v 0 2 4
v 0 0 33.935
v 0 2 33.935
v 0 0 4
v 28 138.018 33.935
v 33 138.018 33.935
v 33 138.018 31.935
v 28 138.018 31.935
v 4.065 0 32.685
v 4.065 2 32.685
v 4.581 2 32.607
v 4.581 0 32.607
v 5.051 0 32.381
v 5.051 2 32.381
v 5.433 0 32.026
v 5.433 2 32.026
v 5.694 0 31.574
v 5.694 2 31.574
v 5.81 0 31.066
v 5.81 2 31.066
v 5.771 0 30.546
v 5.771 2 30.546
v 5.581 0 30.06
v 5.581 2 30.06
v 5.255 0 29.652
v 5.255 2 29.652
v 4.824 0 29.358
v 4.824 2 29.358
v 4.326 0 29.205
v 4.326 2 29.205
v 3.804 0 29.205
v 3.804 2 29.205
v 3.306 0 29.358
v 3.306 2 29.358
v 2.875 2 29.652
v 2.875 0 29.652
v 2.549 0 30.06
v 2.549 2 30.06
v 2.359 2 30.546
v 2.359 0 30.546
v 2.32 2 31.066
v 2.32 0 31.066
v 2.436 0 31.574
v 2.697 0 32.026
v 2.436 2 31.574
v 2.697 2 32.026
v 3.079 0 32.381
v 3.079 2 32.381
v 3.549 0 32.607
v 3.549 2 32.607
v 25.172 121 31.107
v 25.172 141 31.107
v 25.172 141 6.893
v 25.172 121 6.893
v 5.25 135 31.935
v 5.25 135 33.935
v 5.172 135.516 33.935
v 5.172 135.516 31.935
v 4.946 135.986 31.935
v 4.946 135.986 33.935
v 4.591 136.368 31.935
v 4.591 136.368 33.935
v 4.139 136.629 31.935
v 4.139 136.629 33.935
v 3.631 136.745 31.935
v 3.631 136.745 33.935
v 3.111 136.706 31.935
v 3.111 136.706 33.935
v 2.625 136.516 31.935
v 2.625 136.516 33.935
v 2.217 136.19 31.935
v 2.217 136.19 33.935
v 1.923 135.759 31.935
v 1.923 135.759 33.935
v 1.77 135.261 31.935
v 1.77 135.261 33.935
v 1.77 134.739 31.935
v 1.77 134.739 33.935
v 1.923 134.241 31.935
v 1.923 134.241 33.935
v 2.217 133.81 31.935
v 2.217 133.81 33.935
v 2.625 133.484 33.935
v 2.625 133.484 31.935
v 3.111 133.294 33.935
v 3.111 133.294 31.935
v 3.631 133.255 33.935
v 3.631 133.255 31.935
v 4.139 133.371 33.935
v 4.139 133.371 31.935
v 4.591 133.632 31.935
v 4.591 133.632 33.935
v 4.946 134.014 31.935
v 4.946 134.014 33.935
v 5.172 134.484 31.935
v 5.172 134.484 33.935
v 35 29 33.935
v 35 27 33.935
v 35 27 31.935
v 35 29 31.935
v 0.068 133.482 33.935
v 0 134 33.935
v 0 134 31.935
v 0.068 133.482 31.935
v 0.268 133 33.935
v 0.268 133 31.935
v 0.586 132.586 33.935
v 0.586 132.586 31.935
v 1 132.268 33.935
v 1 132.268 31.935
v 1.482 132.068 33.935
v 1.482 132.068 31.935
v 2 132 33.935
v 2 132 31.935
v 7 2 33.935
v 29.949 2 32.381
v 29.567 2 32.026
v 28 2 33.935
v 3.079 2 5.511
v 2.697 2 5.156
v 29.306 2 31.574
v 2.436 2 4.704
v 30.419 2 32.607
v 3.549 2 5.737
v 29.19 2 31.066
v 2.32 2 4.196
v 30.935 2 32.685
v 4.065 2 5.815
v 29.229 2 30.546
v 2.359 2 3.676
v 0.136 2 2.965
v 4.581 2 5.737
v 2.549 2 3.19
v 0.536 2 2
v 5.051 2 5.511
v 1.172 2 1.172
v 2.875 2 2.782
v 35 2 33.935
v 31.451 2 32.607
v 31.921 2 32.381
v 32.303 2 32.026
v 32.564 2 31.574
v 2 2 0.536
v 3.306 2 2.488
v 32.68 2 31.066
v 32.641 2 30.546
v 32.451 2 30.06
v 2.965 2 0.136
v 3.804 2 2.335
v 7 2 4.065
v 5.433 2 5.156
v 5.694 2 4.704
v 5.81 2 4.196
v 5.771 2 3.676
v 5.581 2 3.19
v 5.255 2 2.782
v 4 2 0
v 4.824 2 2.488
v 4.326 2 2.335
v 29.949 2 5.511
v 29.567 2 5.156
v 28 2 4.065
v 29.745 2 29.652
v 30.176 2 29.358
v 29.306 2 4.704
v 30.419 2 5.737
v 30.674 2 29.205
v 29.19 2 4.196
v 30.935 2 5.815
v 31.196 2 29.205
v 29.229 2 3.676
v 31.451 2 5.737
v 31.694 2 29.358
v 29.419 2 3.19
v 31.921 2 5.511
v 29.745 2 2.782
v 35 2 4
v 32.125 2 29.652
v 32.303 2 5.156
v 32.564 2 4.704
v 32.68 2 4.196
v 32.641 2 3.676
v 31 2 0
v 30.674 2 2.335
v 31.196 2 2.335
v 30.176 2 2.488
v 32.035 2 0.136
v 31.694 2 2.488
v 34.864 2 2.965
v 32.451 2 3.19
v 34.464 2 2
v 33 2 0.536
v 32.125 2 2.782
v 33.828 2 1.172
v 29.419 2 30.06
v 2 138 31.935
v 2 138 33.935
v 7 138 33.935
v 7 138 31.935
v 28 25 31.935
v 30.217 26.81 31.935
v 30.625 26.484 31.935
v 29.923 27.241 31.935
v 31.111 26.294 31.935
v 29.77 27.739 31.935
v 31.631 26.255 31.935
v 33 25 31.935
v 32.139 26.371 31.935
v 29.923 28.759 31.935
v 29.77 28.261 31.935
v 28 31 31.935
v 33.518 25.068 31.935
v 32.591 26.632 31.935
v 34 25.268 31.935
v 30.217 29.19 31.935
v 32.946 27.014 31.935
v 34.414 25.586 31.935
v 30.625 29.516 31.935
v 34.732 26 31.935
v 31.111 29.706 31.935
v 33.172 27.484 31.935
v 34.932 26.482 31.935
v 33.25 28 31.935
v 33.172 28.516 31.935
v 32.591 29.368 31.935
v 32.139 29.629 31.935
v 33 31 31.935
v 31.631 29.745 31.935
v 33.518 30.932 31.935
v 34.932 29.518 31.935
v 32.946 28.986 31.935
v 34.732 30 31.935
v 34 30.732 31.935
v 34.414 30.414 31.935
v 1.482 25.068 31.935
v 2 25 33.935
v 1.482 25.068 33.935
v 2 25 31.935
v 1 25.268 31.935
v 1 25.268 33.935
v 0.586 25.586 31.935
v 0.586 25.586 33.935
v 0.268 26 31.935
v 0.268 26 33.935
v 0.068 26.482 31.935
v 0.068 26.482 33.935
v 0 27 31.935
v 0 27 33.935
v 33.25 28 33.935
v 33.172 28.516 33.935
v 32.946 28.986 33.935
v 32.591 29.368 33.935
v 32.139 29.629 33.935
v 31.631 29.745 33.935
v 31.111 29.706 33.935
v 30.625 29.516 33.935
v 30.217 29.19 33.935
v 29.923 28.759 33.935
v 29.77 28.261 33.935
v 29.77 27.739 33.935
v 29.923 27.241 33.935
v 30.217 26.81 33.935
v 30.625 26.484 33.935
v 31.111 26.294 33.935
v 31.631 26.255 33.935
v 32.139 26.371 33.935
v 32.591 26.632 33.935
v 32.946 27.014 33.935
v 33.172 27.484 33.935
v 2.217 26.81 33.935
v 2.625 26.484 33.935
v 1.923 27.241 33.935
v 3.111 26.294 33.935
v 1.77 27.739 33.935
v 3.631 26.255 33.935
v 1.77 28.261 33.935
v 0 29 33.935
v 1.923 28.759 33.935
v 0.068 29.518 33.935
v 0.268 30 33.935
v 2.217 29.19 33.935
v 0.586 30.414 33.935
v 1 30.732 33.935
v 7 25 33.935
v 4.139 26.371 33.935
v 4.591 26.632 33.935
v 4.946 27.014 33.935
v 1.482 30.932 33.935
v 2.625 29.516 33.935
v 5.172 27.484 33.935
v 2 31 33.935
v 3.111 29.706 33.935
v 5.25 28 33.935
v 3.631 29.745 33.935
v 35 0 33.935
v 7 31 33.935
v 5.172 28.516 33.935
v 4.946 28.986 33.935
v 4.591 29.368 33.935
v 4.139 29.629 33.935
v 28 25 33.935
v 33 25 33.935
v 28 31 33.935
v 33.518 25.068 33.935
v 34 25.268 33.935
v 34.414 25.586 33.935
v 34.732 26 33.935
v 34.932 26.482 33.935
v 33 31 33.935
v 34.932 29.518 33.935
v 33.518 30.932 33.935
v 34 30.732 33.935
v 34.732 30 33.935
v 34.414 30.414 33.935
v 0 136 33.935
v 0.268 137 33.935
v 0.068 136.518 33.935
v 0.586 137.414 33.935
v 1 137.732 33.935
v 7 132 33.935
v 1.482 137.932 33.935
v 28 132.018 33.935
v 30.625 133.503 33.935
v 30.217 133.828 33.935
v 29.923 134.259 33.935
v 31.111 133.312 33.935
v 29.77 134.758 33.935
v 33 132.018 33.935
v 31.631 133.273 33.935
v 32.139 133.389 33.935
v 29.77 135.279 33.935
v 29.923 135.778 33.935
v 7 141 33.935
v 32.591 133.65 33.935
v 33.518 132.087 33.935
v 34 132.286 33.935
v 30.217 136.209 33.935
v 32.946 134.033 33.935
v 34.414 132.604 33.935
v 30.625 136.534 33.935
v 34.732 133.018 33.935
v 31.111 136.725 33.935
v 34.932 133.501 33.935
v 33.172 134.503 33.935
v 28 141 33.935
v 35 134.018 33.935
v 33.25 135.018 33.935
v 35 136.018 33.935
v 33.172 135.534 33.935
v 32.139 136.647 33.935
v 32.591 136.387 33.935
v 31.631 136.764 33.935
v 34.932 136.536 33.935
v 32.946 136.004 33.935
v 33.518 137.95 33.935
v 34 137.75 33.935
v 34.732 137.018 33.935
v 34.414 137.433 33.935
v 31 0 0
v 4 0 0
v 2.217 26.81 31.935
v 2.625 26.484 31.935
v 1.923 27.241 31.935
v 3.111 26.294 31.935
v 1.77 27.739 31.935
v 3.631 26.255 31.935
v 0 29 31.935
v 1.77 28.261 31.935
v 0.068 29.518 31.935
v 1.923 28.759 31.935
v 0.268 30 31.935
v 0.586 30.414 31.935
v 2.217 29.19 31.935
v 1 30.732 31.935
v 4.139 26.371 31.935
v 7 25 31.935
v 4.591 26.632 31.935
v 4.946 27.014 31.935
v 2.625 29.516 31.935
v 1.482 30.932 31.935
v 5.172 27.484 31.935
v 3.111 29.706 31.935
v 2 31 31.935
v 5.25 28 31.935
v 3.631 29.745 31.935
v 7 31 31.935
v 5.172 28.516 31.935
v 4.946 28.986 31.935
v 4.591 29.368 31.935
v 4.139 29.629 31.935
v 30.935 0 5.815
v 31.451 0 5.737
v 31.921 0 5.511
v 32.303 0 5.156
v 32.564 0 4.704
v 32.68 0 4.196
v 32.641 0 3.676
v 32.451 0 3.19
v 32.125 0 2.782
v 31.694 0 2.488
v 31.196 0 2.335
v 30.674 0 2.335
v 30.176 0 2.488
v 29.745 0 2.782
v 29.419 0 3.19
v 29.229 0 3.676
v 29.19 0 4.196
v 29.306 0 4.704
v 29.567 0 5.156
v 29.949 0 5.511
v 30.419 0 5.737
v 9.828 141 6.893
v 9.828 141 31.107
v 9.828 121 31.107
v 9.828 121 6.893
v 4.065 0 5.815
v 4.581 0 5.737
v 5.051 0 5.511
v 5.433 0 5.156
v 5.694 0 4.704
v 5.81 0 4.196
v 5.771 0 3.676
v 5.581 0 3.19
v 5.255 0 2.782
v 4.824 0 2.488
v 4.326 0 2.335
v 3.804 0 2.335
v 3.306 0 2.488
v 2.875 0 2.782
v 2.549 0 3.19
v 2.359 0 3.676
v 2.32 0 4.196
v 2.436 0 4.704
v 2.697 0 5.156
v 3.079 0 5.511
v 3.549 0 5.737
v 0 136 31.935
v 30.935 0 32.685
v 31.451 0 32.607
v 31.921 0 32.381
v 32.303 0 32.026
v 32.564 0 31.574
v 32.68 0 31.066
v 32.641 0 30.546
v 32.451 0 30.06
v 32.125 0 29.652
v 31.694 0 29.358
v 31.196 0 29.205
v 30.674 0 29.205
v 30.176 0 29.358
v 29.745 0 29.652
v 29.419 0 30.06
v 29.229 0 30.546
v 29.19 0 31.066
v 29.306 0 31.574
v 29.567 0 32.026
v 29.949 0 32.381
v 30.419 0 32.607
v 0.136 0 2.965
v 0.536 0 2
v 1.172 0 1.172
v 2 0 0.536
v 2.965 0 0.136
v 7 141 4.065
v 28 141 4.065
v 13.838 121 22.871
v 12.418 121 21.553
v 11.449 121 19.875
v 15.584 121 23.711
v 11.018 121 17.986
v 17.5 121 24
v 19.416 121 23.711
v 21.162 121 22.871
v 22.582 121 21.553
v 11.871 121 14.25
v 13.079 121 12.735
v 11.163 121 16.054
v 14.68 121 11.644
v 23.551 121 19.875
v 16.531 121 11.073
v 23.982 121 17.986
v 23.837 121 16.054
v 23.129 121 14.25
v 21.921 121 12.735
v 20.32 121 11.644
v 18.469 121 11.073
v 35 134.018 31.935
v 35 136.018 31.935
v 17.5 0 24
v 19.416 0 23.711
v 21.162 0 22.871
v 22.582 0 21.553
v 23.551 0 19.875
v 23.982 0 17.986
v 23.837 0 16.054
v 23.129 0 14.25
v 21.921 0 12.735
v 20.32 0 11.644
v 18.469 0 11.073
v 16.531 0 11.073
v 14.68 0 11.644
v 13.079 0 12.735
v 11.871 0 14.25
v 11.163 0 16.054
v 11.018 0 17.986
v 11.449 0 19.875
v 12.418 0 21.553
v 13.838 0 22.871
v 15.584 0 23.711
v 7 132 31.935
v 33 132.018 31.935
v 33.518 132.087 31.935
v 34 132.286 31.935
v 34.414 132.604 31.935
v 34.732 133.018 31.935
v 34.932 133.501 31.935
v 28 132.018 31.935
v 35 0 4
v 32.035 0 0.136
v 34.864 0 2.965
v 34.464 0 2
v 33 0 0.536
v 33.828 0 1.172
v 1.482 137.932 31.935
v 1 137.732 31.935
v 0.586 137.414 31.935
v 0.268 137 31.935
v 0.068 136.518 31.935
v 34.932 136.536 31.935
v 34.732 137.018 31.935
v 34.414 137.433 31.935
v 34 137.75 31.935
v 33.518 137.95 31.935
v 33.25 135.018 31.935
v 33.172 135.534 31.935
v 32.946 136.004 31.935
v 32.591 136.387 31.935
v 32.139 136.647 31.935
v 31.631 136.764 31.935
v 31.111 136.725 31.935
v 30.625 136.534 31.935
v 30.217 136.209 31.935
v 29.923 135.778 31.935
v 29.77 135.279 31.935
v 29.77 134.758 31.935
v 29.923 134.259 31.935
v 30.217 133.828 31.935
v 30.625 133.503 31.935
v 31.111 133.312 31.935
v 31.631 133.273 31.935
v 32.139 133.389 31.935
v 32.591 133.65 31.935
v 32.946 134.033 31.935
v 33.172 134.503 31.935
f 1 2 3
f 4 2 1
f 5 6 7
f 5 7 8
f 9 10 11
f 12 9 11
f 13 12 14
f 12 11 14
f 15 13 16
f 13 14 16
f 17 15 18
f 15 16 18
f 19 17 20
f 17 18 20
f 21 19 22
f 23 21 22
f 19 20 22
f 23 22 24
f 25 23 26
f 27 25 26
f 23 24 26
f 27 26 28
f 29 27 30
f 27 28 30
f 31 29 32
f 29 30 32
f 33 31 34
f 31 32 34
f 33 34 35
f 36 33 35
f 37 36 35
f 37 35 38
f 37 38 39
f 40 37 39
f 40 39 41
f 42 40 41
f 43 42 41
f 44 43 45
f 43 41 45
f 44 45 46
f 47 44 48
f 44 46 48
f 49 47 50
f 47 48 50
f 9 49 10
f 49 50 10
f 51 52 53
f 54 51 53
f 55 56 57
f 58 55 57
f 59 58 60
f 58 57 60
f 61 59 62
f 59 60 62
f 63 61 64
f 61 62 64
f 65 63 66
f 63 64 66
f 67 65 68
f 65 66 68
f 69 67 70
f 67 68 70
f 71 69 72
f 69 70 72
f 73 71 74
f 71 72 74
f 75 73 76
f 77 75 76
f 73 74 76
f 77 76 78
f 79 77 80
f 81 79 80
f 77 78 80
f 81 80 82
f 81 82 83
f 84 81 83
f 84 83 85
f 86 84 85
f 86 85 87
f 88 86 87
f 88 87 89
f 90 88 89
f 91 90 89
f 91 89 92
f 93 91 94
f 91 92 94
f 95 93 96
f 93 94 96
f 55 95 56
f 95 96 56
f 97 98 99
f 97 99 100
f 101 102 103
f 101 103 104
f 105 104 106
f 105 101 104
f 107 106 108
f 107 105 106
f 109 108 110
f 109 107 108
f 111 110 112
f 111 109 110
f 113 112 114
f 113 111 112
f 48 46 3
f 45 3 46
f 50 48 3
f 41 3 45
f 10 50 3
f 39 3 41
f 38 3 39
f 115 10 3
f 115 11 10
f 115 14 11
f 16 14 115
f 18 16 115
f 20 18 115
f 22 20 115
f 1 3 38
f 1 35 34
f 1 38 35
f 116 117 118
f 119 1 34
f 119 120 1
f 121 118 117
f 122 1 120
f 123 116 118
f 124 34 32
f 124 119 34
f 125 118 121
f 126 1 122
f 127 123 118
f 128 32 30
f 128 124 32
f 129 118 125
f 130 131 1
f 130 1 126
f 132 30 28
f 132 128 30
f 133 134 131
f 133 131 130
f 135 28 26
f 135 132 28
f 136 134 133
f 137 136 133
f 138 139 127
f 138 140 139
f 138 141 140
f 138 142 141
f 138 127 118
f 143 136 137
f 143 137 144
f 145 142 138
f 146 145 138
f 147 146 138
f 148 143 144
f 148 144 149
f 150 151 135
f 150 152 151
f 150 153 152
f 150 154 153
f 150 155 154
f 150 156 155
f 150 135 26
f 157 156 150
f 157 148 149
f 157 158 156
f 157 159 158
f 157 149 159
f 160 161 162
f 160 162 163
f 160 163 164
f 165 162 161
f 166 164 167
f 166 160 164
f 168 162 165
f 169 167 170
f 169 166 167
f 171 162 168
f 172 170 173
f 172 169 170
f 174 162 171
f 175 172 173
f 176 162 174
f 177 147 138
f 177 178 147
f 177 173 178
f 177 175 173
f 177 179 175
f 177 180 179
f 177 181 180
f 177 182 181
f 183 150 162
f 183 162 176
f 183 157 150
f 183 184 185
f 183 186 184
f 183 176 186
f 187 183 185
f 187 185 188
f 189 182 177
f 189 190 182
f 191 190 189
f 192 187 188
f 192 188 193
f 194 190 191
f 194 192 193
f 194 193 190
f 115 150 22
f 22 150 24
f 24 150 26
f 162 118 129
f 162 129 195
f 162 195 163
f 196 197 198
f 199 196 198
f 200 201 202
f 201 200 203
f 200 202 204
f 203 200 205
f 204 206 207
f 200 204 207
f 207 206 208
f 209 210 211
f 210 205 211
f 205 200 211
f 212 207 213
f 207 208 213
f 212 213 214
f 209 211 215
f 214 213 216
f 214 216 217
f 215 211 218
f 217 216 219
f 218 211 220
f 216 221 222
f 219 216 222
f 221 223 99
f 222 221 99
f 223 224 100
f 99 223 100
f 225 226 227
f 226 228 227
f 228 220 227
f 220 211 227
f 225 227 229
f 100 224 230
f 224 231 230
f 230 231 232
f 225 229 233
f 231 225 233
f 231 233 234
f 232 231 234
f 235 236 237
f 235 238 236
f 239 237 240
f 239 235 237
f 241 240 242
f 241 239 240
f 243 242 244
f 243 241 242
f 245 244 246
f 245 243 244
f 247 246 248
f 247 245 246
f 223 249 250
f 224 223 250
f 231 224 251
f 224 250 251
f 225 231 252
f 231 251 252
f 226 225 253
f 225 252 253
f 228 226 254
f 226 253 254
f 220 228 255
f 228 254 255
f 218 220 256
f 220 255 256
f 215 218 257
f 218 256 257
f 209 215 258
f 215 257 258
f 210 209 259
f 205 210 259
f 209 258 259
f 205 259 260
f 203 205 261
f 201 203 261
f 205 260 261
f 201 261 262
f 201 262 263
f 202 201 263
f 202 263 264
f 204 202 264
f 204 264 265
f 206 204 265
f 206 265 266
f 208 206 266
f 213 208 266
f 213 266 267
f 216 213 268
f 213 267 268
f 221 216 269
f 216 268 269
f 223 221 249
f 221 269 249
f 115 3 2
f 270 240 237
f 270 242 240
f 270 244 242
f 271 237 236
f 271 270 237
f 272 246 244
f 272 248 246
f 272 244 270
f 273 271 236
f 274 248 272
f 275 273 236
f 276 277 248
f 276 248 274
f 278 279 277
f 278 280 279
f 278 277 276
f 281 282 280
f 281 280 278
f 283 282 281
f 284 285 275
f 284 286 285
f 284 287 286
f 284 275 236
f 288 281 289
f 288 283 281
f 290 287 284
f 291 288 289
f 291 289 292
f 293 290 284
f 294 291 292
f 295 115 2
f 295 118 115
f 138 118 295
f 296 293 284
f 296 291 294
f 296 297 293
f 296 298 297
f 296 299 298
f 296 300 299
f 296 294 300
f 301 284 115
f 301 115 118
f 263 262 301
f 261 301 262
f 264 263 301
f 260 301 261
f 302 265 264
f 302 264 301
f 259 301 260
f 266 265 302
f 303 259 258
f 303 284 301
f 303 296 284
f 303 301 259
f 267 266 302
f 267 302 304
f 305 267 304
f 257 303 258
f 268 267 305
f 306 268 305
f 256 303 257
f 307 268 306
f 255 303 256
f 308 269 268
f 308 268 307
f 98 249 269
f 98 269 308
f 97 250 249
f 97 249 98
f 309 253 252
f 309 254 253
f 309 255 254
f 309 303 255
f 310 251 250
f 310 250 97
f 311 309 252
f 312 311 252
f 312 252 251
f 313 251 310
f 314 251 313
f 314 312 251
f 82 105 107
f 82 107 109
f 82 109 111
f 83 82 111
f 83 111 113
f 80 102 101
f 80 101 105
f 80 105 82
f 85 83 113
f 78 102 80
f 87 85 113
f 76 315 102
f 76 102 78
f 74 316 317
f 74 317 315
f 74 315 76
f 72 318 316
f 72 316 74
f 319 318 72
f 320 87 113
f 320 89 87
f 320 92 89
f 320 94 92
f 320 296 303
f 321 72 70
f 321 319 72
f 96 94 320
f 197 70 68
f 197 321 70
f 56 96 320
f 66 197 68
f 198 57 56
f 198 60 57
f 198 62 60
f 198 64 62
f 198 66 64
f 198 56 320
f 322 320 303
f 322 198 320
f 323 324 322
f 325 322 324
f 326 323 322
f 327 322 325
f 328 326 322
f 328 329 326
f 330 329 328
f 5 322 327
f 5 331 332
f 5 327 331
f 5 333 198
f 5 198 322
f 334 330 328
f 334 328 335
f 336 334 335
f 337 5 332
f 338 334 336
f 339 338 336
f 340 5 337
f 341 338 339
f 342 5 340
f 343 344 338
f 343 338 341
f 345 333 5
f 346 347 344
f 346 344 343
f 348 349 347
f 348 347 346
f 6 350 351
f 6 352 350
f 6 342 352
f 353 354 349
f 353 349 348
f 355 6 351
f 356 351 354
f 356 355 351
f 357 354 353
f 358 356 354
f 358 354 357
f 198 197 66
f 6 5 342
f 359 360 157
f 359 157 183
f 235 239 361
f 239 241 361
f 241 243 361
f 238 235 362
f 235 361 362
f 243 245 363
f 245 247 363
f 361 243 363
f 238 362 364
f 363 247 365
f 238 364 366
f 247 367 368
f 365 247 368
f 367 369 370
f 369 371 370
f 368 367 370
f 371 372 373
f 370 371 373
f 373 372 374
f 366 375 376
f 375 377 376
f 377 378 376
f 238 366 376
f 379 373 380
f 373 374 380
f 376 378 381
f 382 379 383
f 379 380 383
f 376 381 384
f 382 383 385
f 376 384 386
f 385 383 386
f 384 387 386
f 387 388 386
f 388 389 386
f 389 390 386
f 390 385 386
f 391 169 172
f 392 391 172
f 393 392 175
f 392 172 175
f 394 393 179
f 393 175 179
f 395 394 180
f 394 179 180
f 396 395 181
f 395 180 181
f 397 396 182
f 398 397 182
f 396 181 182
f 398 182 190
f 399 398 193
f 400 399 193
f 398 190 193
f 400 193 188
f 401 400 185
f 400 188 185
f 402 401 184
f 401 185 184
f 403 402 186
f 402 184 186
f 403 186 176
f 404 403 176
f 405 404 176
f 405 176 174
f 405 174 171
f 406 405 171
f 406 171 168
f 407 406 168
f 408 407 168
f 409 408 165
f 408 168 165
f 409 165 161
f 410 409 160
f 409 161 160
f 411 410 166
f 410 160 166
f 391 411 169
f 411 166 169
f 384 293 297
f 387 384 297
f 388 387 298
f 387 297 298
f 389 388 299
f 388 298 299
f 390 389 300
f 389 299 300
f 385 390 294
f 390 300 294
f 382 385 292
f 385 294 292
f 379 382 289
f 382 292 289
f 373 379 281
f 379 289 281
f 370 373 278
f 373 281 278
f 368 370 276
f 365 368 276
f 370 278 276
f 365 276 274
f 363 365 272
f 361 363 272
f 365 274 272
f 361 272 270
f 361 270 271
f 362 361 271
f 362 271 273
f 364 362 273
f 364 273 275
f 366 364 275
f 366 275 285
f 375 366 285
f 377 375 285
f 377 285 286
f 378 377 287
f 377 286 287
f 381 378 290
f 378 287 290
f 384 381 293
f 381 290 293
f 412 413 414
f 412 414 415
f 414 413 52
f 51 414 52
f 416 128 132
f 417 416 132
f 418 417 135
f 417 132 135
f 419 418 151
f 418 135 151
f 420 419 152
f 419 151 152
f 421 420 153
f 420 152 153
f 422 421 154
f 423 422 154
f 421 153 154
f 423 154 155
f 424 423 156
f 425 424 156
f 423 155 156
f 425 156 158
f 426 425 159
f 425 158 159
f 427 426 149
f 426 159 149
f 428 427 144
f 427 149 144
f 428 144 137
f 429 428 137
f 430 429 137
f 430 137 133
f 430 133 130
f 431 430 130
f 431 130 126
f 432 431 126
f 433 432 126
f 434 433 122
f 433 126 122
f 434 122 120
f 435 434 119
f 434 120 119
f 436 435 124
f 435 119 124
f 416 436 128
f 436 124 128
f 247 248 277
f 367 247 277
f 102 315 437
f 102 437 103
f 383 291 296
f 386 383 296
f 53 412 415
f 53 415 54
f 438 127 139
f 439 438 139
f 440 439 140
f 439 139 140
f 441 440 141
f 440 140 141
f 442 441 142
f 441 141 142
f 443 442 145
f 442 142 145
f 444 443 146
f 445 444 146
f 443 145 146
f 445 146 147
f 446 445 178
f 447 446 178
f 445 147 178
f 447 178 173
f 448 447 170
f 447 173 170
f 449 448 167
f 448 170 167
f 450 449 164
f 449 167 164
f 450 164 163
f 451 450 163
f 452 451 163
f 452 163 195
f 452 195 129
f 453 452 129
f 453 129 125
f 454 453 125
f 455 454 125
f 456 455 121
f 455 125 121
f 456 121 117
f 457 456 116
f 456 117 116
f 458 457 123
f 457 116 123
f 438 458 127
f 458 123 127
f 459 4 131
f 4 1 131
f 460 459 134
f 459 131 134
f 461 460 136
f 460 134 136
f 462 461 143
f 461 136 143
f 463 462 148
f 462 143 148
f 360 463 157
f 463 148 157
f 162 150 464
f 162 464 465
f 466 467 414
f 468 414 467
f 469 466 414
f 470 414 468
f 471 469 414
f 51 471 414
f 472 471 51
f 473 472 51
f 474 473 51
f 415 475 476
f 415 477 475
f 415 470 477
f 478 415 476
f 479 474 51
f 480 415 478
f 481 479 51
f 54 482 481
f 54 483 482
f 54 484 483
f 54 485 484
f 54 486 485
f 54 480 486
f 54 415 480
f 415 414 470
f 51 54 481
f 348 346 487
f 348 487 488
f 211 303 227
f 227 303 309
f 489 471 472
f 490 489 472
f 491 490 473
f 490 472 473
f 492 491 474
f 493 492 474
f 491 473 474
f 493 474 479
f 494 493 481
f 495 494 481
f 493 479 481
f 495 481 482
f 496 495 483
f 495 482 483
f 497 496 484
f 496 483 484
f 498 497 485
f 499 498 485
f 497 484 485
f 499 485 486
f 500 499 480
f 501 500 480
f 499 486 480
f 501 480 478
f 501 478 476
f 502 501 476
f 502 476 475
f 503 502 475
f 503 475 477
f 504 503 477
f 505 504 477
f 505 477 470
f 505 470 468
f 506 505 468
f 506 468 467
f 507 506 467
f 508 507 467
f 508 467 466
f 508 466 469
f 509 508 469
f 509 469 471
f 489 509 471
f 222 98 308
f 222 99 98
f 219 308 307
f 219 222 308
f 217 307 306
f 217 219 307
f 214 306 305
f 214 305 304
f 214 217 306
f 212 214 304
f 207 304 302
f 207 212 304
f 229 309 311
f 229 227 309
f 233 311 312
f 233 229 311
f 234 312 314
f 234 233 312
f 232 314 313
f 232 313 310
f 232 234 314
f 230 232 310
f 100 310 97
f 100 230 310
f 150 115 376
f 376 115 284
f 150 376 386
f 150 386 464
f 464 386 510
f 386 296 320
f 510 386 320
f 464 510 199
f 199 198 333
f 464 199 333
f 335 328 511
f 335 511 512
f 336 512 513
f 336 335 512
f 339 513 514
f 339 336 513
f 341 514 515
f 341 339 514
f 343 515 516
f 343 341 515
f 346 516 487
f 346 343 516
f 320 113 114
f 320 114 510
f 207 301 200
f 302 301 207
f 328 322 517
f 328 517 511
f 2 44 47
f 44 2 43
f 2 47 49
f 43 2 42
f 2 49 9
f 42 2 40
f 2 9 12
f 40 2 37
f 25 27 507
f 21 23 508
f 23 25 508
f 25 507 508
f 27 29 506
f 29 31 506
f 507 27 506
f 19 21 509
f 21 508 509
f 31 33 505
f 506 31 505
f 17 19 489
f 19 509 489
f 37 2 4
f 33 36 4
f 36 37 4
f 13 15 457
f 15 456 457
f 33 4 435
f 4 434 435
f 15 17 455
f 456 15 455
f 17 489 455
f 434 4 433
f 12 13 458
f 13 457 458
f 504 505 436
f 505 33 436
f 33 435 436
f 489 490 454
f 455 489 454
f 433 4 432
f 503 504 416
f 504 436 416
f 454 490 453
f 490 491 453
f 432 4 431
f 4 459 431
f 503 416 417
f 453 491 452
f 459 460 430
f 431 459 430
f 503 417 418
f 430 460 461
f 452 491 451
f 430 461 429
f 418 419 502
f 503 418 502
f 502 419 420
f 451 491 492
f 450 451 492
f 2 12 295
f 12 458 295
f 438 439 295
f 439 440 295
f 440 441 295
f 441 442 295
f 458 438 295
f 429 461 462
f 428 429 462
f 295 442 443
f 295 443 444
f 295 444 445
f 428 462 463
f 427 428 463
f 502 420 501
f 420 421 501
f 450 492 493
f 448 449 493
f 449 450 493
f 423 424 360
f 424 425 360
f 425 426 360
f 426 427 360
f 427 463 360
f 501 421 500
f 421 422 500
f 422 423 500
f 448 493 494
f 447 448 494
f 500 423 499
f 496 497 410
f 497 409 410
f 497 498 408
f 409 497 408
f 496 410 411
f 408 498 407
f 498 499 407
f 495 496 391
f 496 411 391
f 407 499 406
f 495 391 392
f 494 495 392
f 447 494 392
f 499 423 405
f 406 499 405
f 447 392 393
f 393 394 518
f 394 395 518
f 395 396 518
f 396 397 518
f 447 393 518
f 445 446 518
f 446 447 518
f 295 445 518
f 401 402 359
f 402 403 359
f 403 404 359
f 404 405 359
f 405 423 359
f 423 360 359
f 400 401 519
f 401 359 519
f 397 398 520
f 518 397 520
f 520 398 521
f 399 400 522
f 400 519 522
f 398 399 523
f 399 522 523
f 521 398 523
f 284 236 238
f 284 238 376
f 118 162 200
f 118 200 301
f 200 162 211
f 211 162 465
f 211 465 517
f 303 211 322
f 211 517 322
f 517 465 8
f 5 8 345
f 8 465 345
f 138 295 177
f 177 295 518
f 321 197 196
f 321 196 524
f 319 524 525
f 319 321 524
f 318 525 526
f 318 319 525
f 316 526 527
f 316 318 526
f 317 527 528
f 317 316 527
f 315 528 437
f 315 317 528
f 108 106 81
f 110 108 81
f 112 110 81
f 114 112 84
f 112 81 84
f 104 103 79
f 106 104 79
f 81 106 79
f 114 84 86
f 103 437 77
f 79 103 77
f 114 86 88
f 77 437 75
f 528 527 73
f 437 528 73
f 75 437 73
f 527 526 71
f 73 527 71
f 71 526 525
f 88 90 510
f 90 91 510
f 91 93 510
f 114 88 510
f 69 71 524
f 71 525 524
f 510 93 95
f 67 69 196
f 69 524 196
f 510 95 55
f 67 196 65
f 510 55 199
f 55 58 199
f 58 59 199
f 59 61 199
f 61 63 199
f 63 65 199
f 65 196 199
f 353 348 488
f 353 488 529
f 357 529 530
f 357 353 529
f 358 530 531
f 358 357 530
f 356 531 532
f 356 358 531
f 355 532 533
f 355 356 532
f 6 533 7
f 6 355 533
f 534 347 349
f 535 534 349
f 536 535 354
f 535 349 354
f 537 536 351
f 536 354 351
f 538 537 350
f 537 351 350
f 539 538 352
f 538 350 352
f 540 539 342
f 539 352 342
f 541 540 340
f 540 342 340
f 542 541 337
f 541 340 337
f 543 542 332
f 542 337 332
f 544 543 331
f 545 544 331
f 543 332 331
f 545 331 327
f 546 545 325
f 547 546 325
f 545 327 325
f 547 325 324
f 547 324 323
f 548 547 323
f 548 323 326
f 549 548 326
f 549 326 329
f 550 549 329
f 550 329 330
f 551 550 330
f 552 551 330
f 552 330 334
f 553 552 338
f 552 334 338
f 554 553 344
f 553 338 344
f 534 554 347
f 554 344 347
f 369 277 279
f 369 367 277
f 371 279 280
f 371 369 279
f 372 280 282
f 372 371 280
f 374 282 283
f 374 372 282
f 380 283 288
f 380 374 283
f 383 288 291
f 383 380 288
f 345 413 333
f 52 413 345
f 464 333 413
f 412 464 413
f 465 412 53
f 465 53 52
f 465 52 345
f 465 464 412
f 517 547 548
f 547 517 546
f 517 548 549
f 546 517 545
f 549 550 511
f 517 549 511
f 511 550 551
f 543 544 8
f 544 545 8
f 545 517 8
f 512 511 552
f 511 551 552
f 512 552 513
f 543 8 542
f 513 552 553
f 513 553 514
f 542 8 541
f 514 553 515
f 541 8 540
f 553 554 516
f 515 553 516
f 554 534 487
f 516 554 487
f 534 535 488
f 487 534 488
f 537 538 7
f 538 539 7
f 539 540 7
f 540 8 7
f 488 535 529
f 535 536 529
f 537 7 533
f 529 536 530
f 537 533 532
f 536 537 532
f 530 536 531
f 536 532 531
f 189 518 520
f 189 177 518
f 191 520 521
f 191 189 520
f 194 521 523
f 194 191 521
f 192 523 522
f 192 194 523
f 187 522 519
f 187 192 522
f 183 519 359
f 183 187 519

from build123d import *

# Parameters (mm, degrees)
ESQUISSE1_W                   = 35
ESQUISSE1_H                   = 35
BOSS_EXTRU_1_DEPTH            = 2
ESQUISSE2_R                   = 1.75
ESQUISSE2_W                   = 35
ESQUISSE2_H                   = 1.064971157
ENL_V_MAT_EXTRU_1_DEPTH       = 2
BOSS_EXTRU_2_DEPTH            = 280
ESQUISSE5_W                   = 7
ESQUISSE5_H                   = 6
ESQUISSE5_R                   = 1.75
BOSS_EXTRU_3_DEPTH            = 2
ESQUISSE6_R                   = 1.75
BOSS_EXTRU_4_DEPTH            = 2
ESQUISSE10_W                  = 35
ESQUISSE10_H                  = 33.935028843
ESQUISSE10_R                  = 1.75
BOSS_EXTRU_5_DEPTH            = 2
ESQUISSE15_R                  = 6.5
ESQUISSE15_R_2                = 1.75
ENL_V_MAT_EXTRU_2_DEPTH       = 373
CONG_1_R                      = 2
CONG_2_R                      = 4
EXTRU_MINCE1_START            = -2
EXTRU_MINCE1_OUTLINE_W        = 35
EXTRU_MINCE1_OUTLINE_H        = 10
EXTRU_MINCE1_DEPTH            = 2
BOSS_EXTRU_7_DEPTH            = 62.5
BOSS_EXTRU_8_DEPTH            = 160
ENL_V_MAT_EXTRU_4_DEPTH       = 15
BOSS_EXTRU_31_DEPTH           = 69.5
BOSS_EXTRU_31_DEPTH_BACK      = 90.5
ESQUISSE29_W                  = 0.210775501
ESQUISSE29_H                  = 2
BOSS_EXTRU_32_DEPTH           = 160
ENL_V_MAT_EXTRU_7_DEPTH       = 10
ENL_V_MAT_EXTRU_7_DEPTH_BACK  = 5
ESQUISSE34_W                  = 144
ESQUISSE34_H                  = 64.710678118
ENL_V_MAT_EXTRU_8_DEPTH       = 2
ESQUISSE35_R                  = 1.5
BOSS_EXTRU_35_DEPTH           = 2
BOSS_EXTRU_36_START           = -2
ESQUISSE36_R                  = 1.5
BOSS_EXTRU_36_DEPTH           = 2
BOSS_EXTRU_37_DEPTH           = 21
BOSS_EXTRU_38_DEPTH           = 28
ESQUISSE42_W                  = 17
ESQUISSE42_H                  = 6
ENL_V_MAT_EXTRU_9_DEPTH       = 124
ESQUISSE43_R                  = 1.1
ENL_V_MAT_EXTRU_11_DEPTH      = 50
ESQUISSE45_R                  = 1.5
ENL_V_MAT_EXTRU_12_DEPTH      = 50
ESQUISSE47_R                  = 1.75
BOSS_EXTRU_40_DEPTH           = 2
ENL_V_MAT_EXTRU_13_DEPTH      = 2
ESQUISSE49_R                  = 1.75
BOSS_EXTRU_41_DEPTH           = 2
ESQUISSE50_W                  = 12.927363302
ESQUISSE50_H                  = 18
ENL_V_MAT_EXTRU_14_DEPTH      = 2
ESQUISSE51_R                  = 1.75
BOSS_EXTRU_42_DEPTH           = 2
ENL_V_MAT_EXTRU_15_DEPTH      = 1000
ENL_V_MAT_EXTRU_15_DEPTH_BACK = 1000
ESQUISSE53_W                  = 15.34314575
ESQUISSE53_H                  = 24.213203648
ENL_V_MAT_EXTRU_16_DEPTH      = 20


# Read off the part's stored shape, not the designer's step: Extru.-Mince1
with BuildPart() as part:
    # Esquisse1 → Boss.-Extru.1 (new body)
    with BuildSketch(Plane(origin=(0, 0, 0), x_dir=(1, 0, 0), z_dir=(0, 1, 0))):
        with Locations((17.5, -17.5)):
            Rectangle(ESQUISSE1_W, ESQUISSE1_H)
    extrude(amount=BOSS_EXTRU_1_DEPTH)

    # Esquisse2 → Enlèv. mat.-Extru.1 (cut)
    with BuildSketch(Plane(origin=(0, 2, 0), x_dir=(1, 0, 0), z_dir=(0, 1, 0))):
        with Locations(Location((30.935029054, -4.064971369, 0), (0, 0, 270))):
            Circle(ESQUISSE2_R)
        with Locations(Location((30.935028843, -30.935028843, 0), (0, 0, 270))):
            Circle(ESQUISSE2_R)
        with Locations(Location((4.064971369, -4.064970946, 0), (0, 0, 270))):
            Circle(ESQUISSE2_R)
        with Locations(Location((4.064971157, -30.935028843, 0), (0, 0, 270))):
            Circle(ESQUISSE2_R)
        with Locations((17.5, -34.467514421)):
            Rectangle(ESQUISSE2_W, ESQUISSE2_H)
    extrude(amount=-ENL_V_MAT_EXTRU_1_DEPTH, mode=Mode.SUBTRACT)

    # Esquisse4 → Boss.-Extru.2 (add)
    with BuildSketch(Plane(origin=(0, 2, 0), x_dir=(1, 0, 0), z_dir=(0, 1, 0))):
        Polygon((17.5, -33.935028843), (7, -33.935028843), (7, -4.064970946), (28, -4.064970946), (28, -33.935028843), align=None)
    extrude(amount=BOSS_EXTRU_2_DEPTH)

    # Esquisse5 → Boss.-Extru.3 (add)
    # profile 1 of 4: a face of its own
    with BuildSketch(Plane.XY.offset(33.935028843)):
        with Locations((31.5, 254)):
            Rectangle(ESQUISSE5_W, ESQUISSE5_H)
        with Locations((31.5, 254)):
            Circle(ESQUISSE5_R, mode=Mode.SUBTRACT)
    # profile 2 of 4: a face of its own
    with BuildSketch(Plane.XY.offset(33.935028843)):
        with Locations((3.5, 254)):
            Rectangle(ESQUISSE5_W, ESQUISSE5_H)
        with Locations((3.5, 254)):
            Circle(ESQUISSE5_R, mode=Mode.SUBTRACT)
    # profile 3 of 4: a face of its own
    with BuildSketch(Plane.XY.offset(33.935028843)):
        with Locations((31.5, 28)):
            Rectangle(ESQUISSE5_W, ESQUISSE5_H)
        with Locations((31.5, 28)):
            Circle(ESQUISSE5_R, mode=Mode.SUBTRACT)
    # profile 4 of 4: a face of its own
    with BuildSketch(Plane.XY.offset(33.935028843)):
        with Locations((3.5, 28)):
            Rectangle(ESQUISSE5_W, ESQUISSE5_H)
        with Locations((3.5, 28)):
            Circle(ESQUISSE5_R, mode=Mode.SUBTRACT)
    extrude(amount=-BOSS_EXTRU_3_DEPTH)

    # Esquisse6 → Boss.-Extru.4 (add)
    # profile 1 of 2: a face of its own
    with BuildSketch(Plane.XY.offset(33.935028843)):
        Polygon((7, 144), (0, 144), (0, 141), (0, 138), (7, 138), (7, 141), align=None)
        with Locations((3.5, 141)):
            Circle(ESQUISSE6_R, mode=Mode.SUBTRACT)
    # profile 2 of 2: a face of its own
    with BuildSketch(Plane.XY.offset(33.935028843)):
        Polygon((35, 144), (28, 144), (28, 141), (28, 138), (35, 138), (35, 141), align=None)
        with Locations((31.5, 141)):
            Circle(ESQUISSE6_R, mode=Mode.SUBTRACT)
    extrude(amount=-BOSS_EXTRU_4_DEPTH)

    # Esquisse10 → Boss.-Extru.5 (add)
    with BuildSketch(Plane(origin=(0, 282, 0), x_dir=(1, 0, 0), z_dir=(0, 1, 0))):
        with Locations((17.5, -16.967514422)):
            Rectangle(ESQUISSE10_W, ESQUISSE10_H)
        with Locations(Location((30.935028843, -30.935028843, 0), (0, 0, 270))):
            Circle(ESQUISSE10_R, mode=Mode.SUBTRACT)
        with Locations(Location((30.935028631, -4.064970946, 0), (0, 0, 270.000013863))):
            Circle(ESQUISSE10_R, mode=Mode.SUBTRACT)
        with Locations(Location((4.064970946, -4.064971369, 0), (0, 0, 270.000013863))):
            Circle(ESQUISSE10_R, mode=Mode.SUBTRACT)
        with Locations(Location((4.064971157, -30.935028843, 0), (0, 0, 270))):
            Circle(ESQUISSE10_R, mode=Mode.SUBTRACT)
    extrude(amount=-BOSS_EXTRU_5_DEPTH)

    # Esquisse15 → Enlèv. mat.-Extru.2 (cut)
    with BuildSketch(Plane(origin=(0, 282, 0), x_dir=(1, 0, 0), z_dir=(0, 1, 0))):
        with Locations(Location((17.5, -17.5, 0), (0, 0, 270))):
            Circle(ESQUISSE15_R)
        with Locations(Location((30.935029054, -4.064971369, 0), (0, 0, 270))):
            Circle(ESQUISSE15_R_2)
    extrude(amount=-ENL_V_MAT_EXTRU_2_DEPTH, mode=Mode.SUBTRACT)

    # Congé1
    cong_1_edges = [part.edges().sort_by_distance(p)[0] for p in [
        (0, 31, 32.935028843),
        (0, 25, 32.935028843),
        (0, 144, 32.935028843),
        (0, 138, 32.935028843),
        (35, 144, 32.935028843),
        (35, 138, 32.935028843),
        (35, 257, 32.935028843),
        (35, 251, 32.935028843),
        (0, 251, 32.935028843),
        (0, 257, 32.935028843),
        (35, 31, 32.935028843),
        (35, 25, 32.935028843),
    ]]
    fillet(cong_1_edges, radius=CONG_1_R)

    # Congé2
    cong_2_edges = [part.edges().sort_by_distance(p)[0] for p in [
        (35, 281, 0),
        (0, 281, 0),
        (0, 1, 0),
        (35, 1, 0),
    ]]
    fillet(cong_2_edges, radius=CONG_2_R)

    # Extru.-Mince1 outline → Extru.-Mince1 (add)
    with BuildSketch(Plane(origin=(0, 282, 0), x_dir=(1, 0, 0), z_dir=(0, 1, 0)).offset(EXTRU_MINCE1_START)):
        with Locations((17.5, -38.935028843)):
            Rectangle(EXTRU_MINCE1_OUTLINE_W, EXTRU_MINCE1_OUTLINE_H)
    extrude(amount=EXTRU_MINCE1_DEPTH)

    # Esquisse20 → Boss.-Extru.7 (add)
    with BuildSketch(Plane.ZY):
        Polygon((43.935028843, 282), (114.645706961, 211.289321881), (110.645706961, 211.289321881), (41.935028843, 280), (34.145804344, 280), (34.145804344, 282), align=None)
    extrude(amount=BOSS_EXTRU_7_DEPTH)

    # Esquisse21 → Boss.-Extru.8 (add)
    with BuildSketch(Plane.ZY.offset(62.5)):
        Polygon((34.145804344, 280), (41.935028843, 280), (110.645706961, 211.289321881), (114.645706961, 211.289321881), (43.935028843, 282), (34.145804344, 282), align=None)
    extrude(amount=-BOSS_EXTRU_8_DEPTH)

    # Esquisse22 → Enlèv. mat.-Extru.4 (cut)
    with BuildSketch(Plane(origin=(0, 162.967514421, 162.967514421), x_dir=(1, 0, 0), z_dir=(0, 0.7071067811865462, 0.7071067811865488))):
        Polygon((-42.064466094, 147.626821562), (-45.6, 147.626821562), (-45.6, 89.047889374), (-42.064466094, 89.047889374), (-42.064466094, 85.512355468), (77.064466094, 85.512355468), (77.064466094, 89.047889374), (80.6, 89.047889374), (80.6, 147.626821562), (77.064466094, 147.626821562), (77.064466094, 151.162355468), (-42.064466094, 151.162355468), align=None)
    extrude(amount=-ENL_V_MAT_EXTRU_4_DEPTH, mode=Mode.SUBTRACT)

    # Esquisse29 → Boss.-Extru.31 (add, two sides: drawn at the far end of the back side and taken through both)
    with BuildSketch(Plane.ZY.offset(-7).offset(-BOSS_EXTRU_31_DEPTH_BACK)):
        with Locations((34.040416594, 281)):
            Rectangle(ESQUISSE29_W, ESQUISSE29_H)
    extrude(amount=BOSS_EXTRU_31_DEPTH + BOSS_EXTRU_31_DEPTH_BACK)

    # Esquisse32 → Boss.-Extru.32 (add)
    with BuildSketch(Plane.ZY.offset(62.5)):
        Polygon((110.645706961, 211.289321881), (33.935028843, 211.289321881), (33.935028843, 280), (35.935028843, 280), (35.935028843, 213.289321881), (108.645706961, 213.289321881), align=None)
    extrude(amount=-BOSS_EXTRU_32_DEPTH)

    # Esquisse33 → Enlèv. mat.-Extru.7 (cut, two sides: drawn at the far end of the back side and taken through both)
    with BuildSketch(Plane(origin=(0, 0, 33.935028843), x_dir=(-1, 0, 0), z_dir=(0, 0, -1)).offset(-ENL_V_MAT_EXTRU_7_DEPTH_BACK)):
        Polygon((-28, 274.000000001), (-89.5, 274.000000001), (-89.5, 219.289321881), (-81.5, 219.289321881), (-28, 219.289321881), align=None)
        with BuildLine():
            Line((54.5, 274.000000001), (-7, 274.000000001))
            Line((-7, 274.000000001), (-7, 257))
            Line((-7, 257), (-2, 257))
            ThreePointArc((-2, 257), (-0.585786438, 256.414213562), (0, 255))
            Line((0, 255), (0, 253))
            ThreePointArc((0, 253), (-0.585786438, 251.585786438), (-2, 251))
            Line((-2, 251), (-7, 251))
            Line((-7, 251), (-7, 219.289321881))
            Line((-7, 219.289321881), (1, 219.289321881))
            Line((1, 219.289321881), (54.5, 219.289321881))
            Line((54.5, 219.289321881), (54.5, 274.000000001))
        make_face()
        with BuildLine():
            Line((-2, 257), (-7, 257))
            Line((-7, 257), (-7, 251))
            Line((-7, 251), (-2, 251))
            ThreePointArc((-2, 251), (-0.585786438, 251.585786438), (0, 253))
            Line((0, 253), (0, 255))
            ThreePointArc((0, 255), (-0.585786438, 256.414213562), (-2, 257))
        make_face()
    extrude(amount=ENL_V_MAT_EXTRU_7_DEPTH + ENL_V_MAT_EXTRU_7_DEPTH_BACK, mode=Mode.SUBTRACT)

    # Esquisse34 → Enlèv. mat.-Extru.8 (cut)
    with BuildSketch(Plane.XZ.offset(-211.289321881)):
        with Locations((17.5, 74.290367902)):
            Rectangle(ESQUISSE34_W, ESQUISSE34_H)
    extrude(amount=-ENL_V_MAT_EXTRU_8_DEPTH, mode=Mode.SUBTRACT)

    # Esquisse35 → Boss.-Extru.35 (add)
    with BuildSketch(Plane(origin=(97.5, 0, 0), x_dir=(0, 0, -1), z_dir=(1, 0, 0))):
        Polygon((-35.935028843, 280), (-35.935028843, 274.000000001), (-35.935028843, 213.289321881), (-108.645706961, 213.289321881), (-102.645706961, 219.289321881), (-41.935028842, 219.289321881), (-41.935028842, 274.000000001), (-47.935028841, 274.000000001), (-41.935028843, 280), align=None)
        with Locations((-38.935028842, 216.289321881)):
            Circle(ESQUISSE35_R, mode=Mode.SUBTRACT)
        with Locations((-38.935028842, 277.000000001)):
            Circle(ESQUISSE35_R, mode=Mode.SUBTRACT)
        with Locations((-99.645706961, 216.289321881)):
            Circle(ESQUISSE35_R, mode=Mode.SUBTRACT)
    extrude(amount=-BOSS_EXTRU_35_DEPTH)

    # Esquisse36 → Boss.-Extru.36 (add)
    with BuildSketch(Plane.ZY.offset(62.5).offset(BOSS_EXTRU_36_START)):
        Polygon((35.935028843, 213.289321881), (108.645706961, 213.289321881), (102.645706961, 219.289321881), (41.935028842, 219.289321881), (41.935028842, 274.000000001), (47.935028841, 274.000000001), (41.935028843, 280), (35.935028843, 280), (35.935028843, 274.000000001), align=None)
        with Locations(Location((99.645706961, 216.289321881, 0), (0, 0, 180))):
            Circle(ESQUISSE36_R, mode=Mode.SUBTRACT)
        with Locations(Location((38.935028842, 277.000000001, 0), (0, 0, 180))):
            Circle(ESQUISSE36_R, mode=Mode.SUBTRACT)
        with Locations(Location((38.935028842, 216.289321881, 0), (0, 0, 180))):
            Circle(ESQUISSE36_R, mode=Mode.SUBTRACT)
    extrude(amount=BOSS_EXTRU_36_DEPTH)

    # Esquisse39 → Boss.-Extru.37 (add)
    with BuildSketch(Plane(origin=(28, 0, 0), x_dir=(0, 0, -1), z_dir=(1, 0, 0))):
        Polygon((-33.935028843, 211.289321881), (-33.935028843, 191.289321881), (-118.935028843, 201.289321881), (-118.935028843, 211.289321881), align=None)
    extrude(amount=-BOSS_EXTRU_37_DEPTH)

    # Esquisse40 → Boss.-Extru.38 (add)
    with BuildSketch(Plane.XY.offset(118.935028843)):
        Polygon((7, 201.289321881), (2, 201.289321881), (2, 203.289321881), (33, 203.289321881), (33, 201.289321881), (28, 201.289321881), align=None)
    extrude(amount=BOSS_EXTRU_38_DEPTH)

    # Esquisse42 → Enlèv. mat.-Extru.9 (cut)
    with BuildSketch(Plane.XY.offset(118.935028843)):
        with Locations((17.5, 208.289321881)):
            Rectangle(ESQUISSE42_W, ESQUISSE42_H)
    extrude(amount=-ENL_V_MAT_EXTRU_9_DEPTH, mode=Mode.SUBTRACT)

    # Esquisse43 → Enlèv. mat.-Extru.11 (cut)
    with BuildSketch(Plane(origin=(0, 203.289321881, 0), x_dir=(1, 0, 0), z_dir=(0, 1, 0))):
        with Locations(Location((5, -144.935028843, 0), (0, 0, 270))):
            Circle(ESQUISSE43_R)
        with Locations(Location((30, -144.935028843, 0), (0, 0, 270))):
            Circle(ESQUISSE43_R)
        with Locations(Location((5, -130.435028843, 0), (0, 0, 270))):
            Circle(ESQUISSE43_R)
        with Locations(Location((30, -130.435028843, 0), (0, 0, 270))):
            Circle(ESQUISSE43_R)
        with BuildLine():
            Line((5, -123.319506434), (5, -128.435028843))
            ThreePointArc((5, -128.435028843), (7, -130.435028843), (5, -132.435028843))
            Line((5, -132.435028843), (5, -142.935028843))
            ThreePointArc((5, -142.935028843), (6.414213562, -143.52081528), (7, -144.935028843))
            Line((7, -144.935028843), (28, -144.935028843))
            ThreePointArc((28, -144.935028843), (28.585786438, -143.52081528), (30, -142.935028843))
            Line((30, -142.935028843), (30, -132.435028843))
            ThreePointArc((30, -132.435028843), (28, -130.435028843), (30, -128.435028843))
            Line((30, -128.435028843), (30, -123.319506434))
            Line((30, -123.319506434), (5, -123.319506434))
        make_face()
    extrude(amount=-ENL_V_MAT_EXTRU_11_DEPTH, mode=Mode.SUBTRACT)

    # Esquisse45 → Enlèv. mat.-Extru.12 (cut)
    with BuildSketch(Plane(origin=(0, 162.967514421, 162.967514421), x_dir=(1, 0, 0), z_dir=(0, 0.7071067811865462, 0.7071067811865488))):
        with Locations(Location((80.6, 151.162355468, 0), (0, 0, 270))):
            Circle(ESQUISSE45_R)
        with Locations(Location((80.6, 85.512355468, 0), (0, 0, 270))):
            Circle(ESQUISSE45_R)
        with Locations(Location((-45.6, 85.512355468, 0), (0, 0, 270))):
            Circle(ESQUISSE45_R)
        with Locations(Location((-45.6, 151.162355468, 0), (0, 0, 270))):
            Circle(ESQUISSE45_R)
    extrude(amount=-ENL_V_MAT_EXTRU_12_DEPTH, mode=Mode.SUBTRACT)

    # Esquisse47 → Boss.-Extru.40 (add)
    # profile 1 of 4: a face of its own
    with BuildSketch(Plane.XY.offset(33.935028843)):
        with BuildLine():
            Line((2, 144), (7, 144))
            Line((7, 144), (7, 150))
            Line((7, 150), (2, 150))
            ThreePointArc((2, 150), (0.585786438, 149.414213562), (0, 148))
            Line((0, 148), (0, 146))
            ThreePointArc((0, 146), (0.585786438, 144.585786438), (2, 144))
        make_face()
        with Locations((3.5, 147)):
            Circle(ESQUISSE47_R, mode=Mode.SUBTRACT)
    # profile 2 of 4: a face of its own
    with BuildSketch(Plane.XY.offset(33.935028843)):
        with BuildLine():
            Line((28, 150), (28, 144))
            Line((28, 144), (33, 144))
            ThreePointArc((33, 144), (34.414213562, 144.585786438), (35, 146))
            Line((35, 146), (35, 148))
            ThreePointArc((35, 148), (34.414213562, 149.414213562), (33, 150))
            Line((33, 150), (28, 150))
        make_face()
        with Locations((31.5, 147)):
            Circle(ESQUISSE47_R, mode=Mode.SUBTRACT)
    # profile 3 of 4: a face of its own
    with BuildSketch(Plane.XY.offset(33.935028843)):
        with BuildLine():
            Line((35, 134), (35, 136))
            ThreePointArc((35, 136), (34.414213562, 137.414213562), (33, 138))
            Line((33, 138), (28, 138))
            Line((28, 138), (28, 132))
            Line((28, 132), (33, 132))
            ThreePointArc((33, 132), (34.414213562, 132.585786438), (35, 134))
        make_face()
        with Locations((31.5, 135)):
            Circle(ESQUISSE47_R, mode=Mode.SUBTRACT)
    # profile 4 of 4: a face of its own
    with BuildSketch(Plane.XY.offset(33.935028843)):
        with BuildLine():
            Line((7, 138), (2, 138))
            ThreePointArc((2, 138), (0.585786438, 137.414213562), (0, 136))
            Line((0, 136), (0, 134))
            ThreePointArc((0, 134), (0.585786438, 132.585786438), (2, 132))
            Line((2, 132), (7, 132))
            Line((7, 132), (7, 138))
        make_face()
        with Locations((3.5, 135)):
            Circle(ESQUISSE47_R, mode=Mode.SUBTRACT)
    extrude(amount=-BOSS_EXTRU_40_DEPTH)

    # Esquisse48 → Enlèv. mat.-Extru.13 (cut)
    with BuildSketch(Plane.XY.offset(33.935028843)):
        Polygon((-4.556540033, 144), (-4.556540033, 138), (2, 138), (7, 138), (7, 144), (2, 144), align=None)
        Polygon((33.295178048, 144), (39.851718081, 144), (39.851718081, 138), (33.295178048, 138), (28.295178048, 138), (28.295178048, 144), align=None)
    extrude(amount=-ENL_V_MAT_EXTRU_13_DEPTH, mode=Mode.SUBTRACT)

    # Esquisse49 → Boss.-Extru.41 (add)
    # profile 1 of 2: a face of its own
    with BuildSketch(Plane.XY.offset(33.935028843)):
        with BuildLine():
            Line((2, 180.289321881), (7, 180.289321881))
            Line((7, 180.289321881), (7, 186.289321881))
            Line((7, 186.289321881), (2, 186.289321881))
            ThreePointArc((2, 186.289321881), (0.585786438, 185.703535444), (0, 184.289321881))
            Line((0, 184.289321881), (0, 182.289321881))
            ThreePointArc((0, 182.289321881), (0.585786438, 180.875108319), (2, 180.289321881))
        make_face()
        with Locations((3.5, 183.289321881)):
            Circle(ESQUISSE49_R, mode=Mode.SUBTRACT)
    # profile 2 of 2: a face of its own
    with BuildSketch(Plane.XY.offset(33.935028843)):
        with BuildLine():
            Line((35, 182.289321881), (35, 184.289321881))
            ThreePointArc((35, 184.289321881), (34.414213562, 185.703535444), (33, 186.289321881))
            Line((33, 186.289321881), (28, 186.289321881))
            Line((28, 186.289321881), (28, 180.289321881))
            Line((28, 180.289321881), (33, 180.289321881))
            ThreePointArc((33, 180.289321881), (34.414213562, 180.875108319), (35, 182.289321881))
        make_face()
        with Locations((31.5, 183.289321881)):
            Circle(ESQUISSE49_R, mode=Mode.SUBTRACT)
    extrude(amount=-BOSS_EXTRU_41_DEPTH)

    # Esquisse50 → Enlèv. mat.-Extru.14 (cut)
    with BuildSketch(Plane.XY.offset(33.935028843)):
        with Locations((34.463681651, 141)):
            Rectangle(ESQUISSE50_W, ESQUISSE50_H)
    extrude(amount=-ENL_V_MAT_EXTRU_14_DEPTH, mode=Mode.SUBTRACT)

    # Esquisse51 → Boss.-Extru.42 (add)
    # profile 1 of 3: a face of its own
    with BuildSketch(Plane.XY.offset(33.935028843)):
        with BuildLine():
            Line((7, 150), (7, 144))
            Line((7, 144), (2, 144))
            ThreePointArc((2, 144), (0.585786438, 144.585786438), (0, 146))
            Line((0, 146), (0, 148))
            ThreePointArc((0, 148), (0.585786438, 149.414213562), (2, 150))
            Line((2, 150), (7, 150))
        make_face()
        with Locations((3.5, 147)):
            Circle(ESQUISSE51_R, mode=Mode.SUBTRACT)
    # profile 2 of 3: a face of its own
    with BuildSketch(Plane.XY.offset(33.935028843)):
        with BuildLine():
            Line((33, 138.018442997), (28, 138.018442997))
            Line((28, 138.018442997), (28, 132.018442997))
            Line((28, 132.018442997), (33, 132.018442997))
            ThreePointArc((33, 132.018442997), (34.414213562, 132.604229434), (35, 134.018442997))
            Line((35, 134.018442997), (35, 136.018442997))
            ThreePointArc((35, 136.018442997), (34.414213562, 137.432656559), (33, 138.018442997))
        make_face()
        with Locations((31.5, 135.018442997)):
            Circle(ESQUISSE51_R, mode=Mode.SUBTRACT)
    # profile 3 of 3: a face of its own
    with BuildSketch(Plane.XY.offset(33.935028843)):
        with BuildLine():
            Line((33, 150), (28, 150))
            Line((28, 150), (28, 144))
            Line((28, 144), (33, 144))
            ThreePointArc((33, 144), (34.414213562, 144.585786438), (35, 146))
            Line((35, 146), (35, 148))
            ThreePointArc((35, 148), (34.414213562, 149.414213562), (33, 150))
        make_face()
        with Locations((31.5, 147)):
            Circle(ESQUISSE51_R, mode=Mode.SUBTRACT)
    extrude(amount=-BOSS_EXTRU_42_DEPTH)

    # Esquisse52 → Enlèv. mat.-Extru.15 (cut, two sides: drawn at the far end of the back side and taken through both)
    with BuildSketch(Plane.XY.offset(33.935028843).offset(-ENL_V_MAT_EXTRU_15_DEPTH_BACK)):
        Polygon((178.674523554, 141), (7, 141), (-154.270399125, 141), (-154.270399125, 365.360824734), (178.674523554, 365.360824734), align=None)
    extrude(amount=ENL_V_MAT_EXTRU_15_DEPTH + ENL_V_MAT_EXTRU_15_DEPTH_BACK, mode=Mode.SUBTRACT)

    # Esquisse53 → Enlèv. mat.-Extru.16 (cut)
    with BuildSketch(Plane(origin=(0, 141, 0), x_dir=(1, 0, 0), z_dir=(0, 1, 0))):
        with Locations((17.5, -18.999999894)):
            Rectangle(ESQUISSE53_W, ESQUISSE53_H)
    extrude(amount=-ENL_V_MAT_EXTRU_16_DEPTH, mode=Mode.SUBTRACT)


solid = part.part
